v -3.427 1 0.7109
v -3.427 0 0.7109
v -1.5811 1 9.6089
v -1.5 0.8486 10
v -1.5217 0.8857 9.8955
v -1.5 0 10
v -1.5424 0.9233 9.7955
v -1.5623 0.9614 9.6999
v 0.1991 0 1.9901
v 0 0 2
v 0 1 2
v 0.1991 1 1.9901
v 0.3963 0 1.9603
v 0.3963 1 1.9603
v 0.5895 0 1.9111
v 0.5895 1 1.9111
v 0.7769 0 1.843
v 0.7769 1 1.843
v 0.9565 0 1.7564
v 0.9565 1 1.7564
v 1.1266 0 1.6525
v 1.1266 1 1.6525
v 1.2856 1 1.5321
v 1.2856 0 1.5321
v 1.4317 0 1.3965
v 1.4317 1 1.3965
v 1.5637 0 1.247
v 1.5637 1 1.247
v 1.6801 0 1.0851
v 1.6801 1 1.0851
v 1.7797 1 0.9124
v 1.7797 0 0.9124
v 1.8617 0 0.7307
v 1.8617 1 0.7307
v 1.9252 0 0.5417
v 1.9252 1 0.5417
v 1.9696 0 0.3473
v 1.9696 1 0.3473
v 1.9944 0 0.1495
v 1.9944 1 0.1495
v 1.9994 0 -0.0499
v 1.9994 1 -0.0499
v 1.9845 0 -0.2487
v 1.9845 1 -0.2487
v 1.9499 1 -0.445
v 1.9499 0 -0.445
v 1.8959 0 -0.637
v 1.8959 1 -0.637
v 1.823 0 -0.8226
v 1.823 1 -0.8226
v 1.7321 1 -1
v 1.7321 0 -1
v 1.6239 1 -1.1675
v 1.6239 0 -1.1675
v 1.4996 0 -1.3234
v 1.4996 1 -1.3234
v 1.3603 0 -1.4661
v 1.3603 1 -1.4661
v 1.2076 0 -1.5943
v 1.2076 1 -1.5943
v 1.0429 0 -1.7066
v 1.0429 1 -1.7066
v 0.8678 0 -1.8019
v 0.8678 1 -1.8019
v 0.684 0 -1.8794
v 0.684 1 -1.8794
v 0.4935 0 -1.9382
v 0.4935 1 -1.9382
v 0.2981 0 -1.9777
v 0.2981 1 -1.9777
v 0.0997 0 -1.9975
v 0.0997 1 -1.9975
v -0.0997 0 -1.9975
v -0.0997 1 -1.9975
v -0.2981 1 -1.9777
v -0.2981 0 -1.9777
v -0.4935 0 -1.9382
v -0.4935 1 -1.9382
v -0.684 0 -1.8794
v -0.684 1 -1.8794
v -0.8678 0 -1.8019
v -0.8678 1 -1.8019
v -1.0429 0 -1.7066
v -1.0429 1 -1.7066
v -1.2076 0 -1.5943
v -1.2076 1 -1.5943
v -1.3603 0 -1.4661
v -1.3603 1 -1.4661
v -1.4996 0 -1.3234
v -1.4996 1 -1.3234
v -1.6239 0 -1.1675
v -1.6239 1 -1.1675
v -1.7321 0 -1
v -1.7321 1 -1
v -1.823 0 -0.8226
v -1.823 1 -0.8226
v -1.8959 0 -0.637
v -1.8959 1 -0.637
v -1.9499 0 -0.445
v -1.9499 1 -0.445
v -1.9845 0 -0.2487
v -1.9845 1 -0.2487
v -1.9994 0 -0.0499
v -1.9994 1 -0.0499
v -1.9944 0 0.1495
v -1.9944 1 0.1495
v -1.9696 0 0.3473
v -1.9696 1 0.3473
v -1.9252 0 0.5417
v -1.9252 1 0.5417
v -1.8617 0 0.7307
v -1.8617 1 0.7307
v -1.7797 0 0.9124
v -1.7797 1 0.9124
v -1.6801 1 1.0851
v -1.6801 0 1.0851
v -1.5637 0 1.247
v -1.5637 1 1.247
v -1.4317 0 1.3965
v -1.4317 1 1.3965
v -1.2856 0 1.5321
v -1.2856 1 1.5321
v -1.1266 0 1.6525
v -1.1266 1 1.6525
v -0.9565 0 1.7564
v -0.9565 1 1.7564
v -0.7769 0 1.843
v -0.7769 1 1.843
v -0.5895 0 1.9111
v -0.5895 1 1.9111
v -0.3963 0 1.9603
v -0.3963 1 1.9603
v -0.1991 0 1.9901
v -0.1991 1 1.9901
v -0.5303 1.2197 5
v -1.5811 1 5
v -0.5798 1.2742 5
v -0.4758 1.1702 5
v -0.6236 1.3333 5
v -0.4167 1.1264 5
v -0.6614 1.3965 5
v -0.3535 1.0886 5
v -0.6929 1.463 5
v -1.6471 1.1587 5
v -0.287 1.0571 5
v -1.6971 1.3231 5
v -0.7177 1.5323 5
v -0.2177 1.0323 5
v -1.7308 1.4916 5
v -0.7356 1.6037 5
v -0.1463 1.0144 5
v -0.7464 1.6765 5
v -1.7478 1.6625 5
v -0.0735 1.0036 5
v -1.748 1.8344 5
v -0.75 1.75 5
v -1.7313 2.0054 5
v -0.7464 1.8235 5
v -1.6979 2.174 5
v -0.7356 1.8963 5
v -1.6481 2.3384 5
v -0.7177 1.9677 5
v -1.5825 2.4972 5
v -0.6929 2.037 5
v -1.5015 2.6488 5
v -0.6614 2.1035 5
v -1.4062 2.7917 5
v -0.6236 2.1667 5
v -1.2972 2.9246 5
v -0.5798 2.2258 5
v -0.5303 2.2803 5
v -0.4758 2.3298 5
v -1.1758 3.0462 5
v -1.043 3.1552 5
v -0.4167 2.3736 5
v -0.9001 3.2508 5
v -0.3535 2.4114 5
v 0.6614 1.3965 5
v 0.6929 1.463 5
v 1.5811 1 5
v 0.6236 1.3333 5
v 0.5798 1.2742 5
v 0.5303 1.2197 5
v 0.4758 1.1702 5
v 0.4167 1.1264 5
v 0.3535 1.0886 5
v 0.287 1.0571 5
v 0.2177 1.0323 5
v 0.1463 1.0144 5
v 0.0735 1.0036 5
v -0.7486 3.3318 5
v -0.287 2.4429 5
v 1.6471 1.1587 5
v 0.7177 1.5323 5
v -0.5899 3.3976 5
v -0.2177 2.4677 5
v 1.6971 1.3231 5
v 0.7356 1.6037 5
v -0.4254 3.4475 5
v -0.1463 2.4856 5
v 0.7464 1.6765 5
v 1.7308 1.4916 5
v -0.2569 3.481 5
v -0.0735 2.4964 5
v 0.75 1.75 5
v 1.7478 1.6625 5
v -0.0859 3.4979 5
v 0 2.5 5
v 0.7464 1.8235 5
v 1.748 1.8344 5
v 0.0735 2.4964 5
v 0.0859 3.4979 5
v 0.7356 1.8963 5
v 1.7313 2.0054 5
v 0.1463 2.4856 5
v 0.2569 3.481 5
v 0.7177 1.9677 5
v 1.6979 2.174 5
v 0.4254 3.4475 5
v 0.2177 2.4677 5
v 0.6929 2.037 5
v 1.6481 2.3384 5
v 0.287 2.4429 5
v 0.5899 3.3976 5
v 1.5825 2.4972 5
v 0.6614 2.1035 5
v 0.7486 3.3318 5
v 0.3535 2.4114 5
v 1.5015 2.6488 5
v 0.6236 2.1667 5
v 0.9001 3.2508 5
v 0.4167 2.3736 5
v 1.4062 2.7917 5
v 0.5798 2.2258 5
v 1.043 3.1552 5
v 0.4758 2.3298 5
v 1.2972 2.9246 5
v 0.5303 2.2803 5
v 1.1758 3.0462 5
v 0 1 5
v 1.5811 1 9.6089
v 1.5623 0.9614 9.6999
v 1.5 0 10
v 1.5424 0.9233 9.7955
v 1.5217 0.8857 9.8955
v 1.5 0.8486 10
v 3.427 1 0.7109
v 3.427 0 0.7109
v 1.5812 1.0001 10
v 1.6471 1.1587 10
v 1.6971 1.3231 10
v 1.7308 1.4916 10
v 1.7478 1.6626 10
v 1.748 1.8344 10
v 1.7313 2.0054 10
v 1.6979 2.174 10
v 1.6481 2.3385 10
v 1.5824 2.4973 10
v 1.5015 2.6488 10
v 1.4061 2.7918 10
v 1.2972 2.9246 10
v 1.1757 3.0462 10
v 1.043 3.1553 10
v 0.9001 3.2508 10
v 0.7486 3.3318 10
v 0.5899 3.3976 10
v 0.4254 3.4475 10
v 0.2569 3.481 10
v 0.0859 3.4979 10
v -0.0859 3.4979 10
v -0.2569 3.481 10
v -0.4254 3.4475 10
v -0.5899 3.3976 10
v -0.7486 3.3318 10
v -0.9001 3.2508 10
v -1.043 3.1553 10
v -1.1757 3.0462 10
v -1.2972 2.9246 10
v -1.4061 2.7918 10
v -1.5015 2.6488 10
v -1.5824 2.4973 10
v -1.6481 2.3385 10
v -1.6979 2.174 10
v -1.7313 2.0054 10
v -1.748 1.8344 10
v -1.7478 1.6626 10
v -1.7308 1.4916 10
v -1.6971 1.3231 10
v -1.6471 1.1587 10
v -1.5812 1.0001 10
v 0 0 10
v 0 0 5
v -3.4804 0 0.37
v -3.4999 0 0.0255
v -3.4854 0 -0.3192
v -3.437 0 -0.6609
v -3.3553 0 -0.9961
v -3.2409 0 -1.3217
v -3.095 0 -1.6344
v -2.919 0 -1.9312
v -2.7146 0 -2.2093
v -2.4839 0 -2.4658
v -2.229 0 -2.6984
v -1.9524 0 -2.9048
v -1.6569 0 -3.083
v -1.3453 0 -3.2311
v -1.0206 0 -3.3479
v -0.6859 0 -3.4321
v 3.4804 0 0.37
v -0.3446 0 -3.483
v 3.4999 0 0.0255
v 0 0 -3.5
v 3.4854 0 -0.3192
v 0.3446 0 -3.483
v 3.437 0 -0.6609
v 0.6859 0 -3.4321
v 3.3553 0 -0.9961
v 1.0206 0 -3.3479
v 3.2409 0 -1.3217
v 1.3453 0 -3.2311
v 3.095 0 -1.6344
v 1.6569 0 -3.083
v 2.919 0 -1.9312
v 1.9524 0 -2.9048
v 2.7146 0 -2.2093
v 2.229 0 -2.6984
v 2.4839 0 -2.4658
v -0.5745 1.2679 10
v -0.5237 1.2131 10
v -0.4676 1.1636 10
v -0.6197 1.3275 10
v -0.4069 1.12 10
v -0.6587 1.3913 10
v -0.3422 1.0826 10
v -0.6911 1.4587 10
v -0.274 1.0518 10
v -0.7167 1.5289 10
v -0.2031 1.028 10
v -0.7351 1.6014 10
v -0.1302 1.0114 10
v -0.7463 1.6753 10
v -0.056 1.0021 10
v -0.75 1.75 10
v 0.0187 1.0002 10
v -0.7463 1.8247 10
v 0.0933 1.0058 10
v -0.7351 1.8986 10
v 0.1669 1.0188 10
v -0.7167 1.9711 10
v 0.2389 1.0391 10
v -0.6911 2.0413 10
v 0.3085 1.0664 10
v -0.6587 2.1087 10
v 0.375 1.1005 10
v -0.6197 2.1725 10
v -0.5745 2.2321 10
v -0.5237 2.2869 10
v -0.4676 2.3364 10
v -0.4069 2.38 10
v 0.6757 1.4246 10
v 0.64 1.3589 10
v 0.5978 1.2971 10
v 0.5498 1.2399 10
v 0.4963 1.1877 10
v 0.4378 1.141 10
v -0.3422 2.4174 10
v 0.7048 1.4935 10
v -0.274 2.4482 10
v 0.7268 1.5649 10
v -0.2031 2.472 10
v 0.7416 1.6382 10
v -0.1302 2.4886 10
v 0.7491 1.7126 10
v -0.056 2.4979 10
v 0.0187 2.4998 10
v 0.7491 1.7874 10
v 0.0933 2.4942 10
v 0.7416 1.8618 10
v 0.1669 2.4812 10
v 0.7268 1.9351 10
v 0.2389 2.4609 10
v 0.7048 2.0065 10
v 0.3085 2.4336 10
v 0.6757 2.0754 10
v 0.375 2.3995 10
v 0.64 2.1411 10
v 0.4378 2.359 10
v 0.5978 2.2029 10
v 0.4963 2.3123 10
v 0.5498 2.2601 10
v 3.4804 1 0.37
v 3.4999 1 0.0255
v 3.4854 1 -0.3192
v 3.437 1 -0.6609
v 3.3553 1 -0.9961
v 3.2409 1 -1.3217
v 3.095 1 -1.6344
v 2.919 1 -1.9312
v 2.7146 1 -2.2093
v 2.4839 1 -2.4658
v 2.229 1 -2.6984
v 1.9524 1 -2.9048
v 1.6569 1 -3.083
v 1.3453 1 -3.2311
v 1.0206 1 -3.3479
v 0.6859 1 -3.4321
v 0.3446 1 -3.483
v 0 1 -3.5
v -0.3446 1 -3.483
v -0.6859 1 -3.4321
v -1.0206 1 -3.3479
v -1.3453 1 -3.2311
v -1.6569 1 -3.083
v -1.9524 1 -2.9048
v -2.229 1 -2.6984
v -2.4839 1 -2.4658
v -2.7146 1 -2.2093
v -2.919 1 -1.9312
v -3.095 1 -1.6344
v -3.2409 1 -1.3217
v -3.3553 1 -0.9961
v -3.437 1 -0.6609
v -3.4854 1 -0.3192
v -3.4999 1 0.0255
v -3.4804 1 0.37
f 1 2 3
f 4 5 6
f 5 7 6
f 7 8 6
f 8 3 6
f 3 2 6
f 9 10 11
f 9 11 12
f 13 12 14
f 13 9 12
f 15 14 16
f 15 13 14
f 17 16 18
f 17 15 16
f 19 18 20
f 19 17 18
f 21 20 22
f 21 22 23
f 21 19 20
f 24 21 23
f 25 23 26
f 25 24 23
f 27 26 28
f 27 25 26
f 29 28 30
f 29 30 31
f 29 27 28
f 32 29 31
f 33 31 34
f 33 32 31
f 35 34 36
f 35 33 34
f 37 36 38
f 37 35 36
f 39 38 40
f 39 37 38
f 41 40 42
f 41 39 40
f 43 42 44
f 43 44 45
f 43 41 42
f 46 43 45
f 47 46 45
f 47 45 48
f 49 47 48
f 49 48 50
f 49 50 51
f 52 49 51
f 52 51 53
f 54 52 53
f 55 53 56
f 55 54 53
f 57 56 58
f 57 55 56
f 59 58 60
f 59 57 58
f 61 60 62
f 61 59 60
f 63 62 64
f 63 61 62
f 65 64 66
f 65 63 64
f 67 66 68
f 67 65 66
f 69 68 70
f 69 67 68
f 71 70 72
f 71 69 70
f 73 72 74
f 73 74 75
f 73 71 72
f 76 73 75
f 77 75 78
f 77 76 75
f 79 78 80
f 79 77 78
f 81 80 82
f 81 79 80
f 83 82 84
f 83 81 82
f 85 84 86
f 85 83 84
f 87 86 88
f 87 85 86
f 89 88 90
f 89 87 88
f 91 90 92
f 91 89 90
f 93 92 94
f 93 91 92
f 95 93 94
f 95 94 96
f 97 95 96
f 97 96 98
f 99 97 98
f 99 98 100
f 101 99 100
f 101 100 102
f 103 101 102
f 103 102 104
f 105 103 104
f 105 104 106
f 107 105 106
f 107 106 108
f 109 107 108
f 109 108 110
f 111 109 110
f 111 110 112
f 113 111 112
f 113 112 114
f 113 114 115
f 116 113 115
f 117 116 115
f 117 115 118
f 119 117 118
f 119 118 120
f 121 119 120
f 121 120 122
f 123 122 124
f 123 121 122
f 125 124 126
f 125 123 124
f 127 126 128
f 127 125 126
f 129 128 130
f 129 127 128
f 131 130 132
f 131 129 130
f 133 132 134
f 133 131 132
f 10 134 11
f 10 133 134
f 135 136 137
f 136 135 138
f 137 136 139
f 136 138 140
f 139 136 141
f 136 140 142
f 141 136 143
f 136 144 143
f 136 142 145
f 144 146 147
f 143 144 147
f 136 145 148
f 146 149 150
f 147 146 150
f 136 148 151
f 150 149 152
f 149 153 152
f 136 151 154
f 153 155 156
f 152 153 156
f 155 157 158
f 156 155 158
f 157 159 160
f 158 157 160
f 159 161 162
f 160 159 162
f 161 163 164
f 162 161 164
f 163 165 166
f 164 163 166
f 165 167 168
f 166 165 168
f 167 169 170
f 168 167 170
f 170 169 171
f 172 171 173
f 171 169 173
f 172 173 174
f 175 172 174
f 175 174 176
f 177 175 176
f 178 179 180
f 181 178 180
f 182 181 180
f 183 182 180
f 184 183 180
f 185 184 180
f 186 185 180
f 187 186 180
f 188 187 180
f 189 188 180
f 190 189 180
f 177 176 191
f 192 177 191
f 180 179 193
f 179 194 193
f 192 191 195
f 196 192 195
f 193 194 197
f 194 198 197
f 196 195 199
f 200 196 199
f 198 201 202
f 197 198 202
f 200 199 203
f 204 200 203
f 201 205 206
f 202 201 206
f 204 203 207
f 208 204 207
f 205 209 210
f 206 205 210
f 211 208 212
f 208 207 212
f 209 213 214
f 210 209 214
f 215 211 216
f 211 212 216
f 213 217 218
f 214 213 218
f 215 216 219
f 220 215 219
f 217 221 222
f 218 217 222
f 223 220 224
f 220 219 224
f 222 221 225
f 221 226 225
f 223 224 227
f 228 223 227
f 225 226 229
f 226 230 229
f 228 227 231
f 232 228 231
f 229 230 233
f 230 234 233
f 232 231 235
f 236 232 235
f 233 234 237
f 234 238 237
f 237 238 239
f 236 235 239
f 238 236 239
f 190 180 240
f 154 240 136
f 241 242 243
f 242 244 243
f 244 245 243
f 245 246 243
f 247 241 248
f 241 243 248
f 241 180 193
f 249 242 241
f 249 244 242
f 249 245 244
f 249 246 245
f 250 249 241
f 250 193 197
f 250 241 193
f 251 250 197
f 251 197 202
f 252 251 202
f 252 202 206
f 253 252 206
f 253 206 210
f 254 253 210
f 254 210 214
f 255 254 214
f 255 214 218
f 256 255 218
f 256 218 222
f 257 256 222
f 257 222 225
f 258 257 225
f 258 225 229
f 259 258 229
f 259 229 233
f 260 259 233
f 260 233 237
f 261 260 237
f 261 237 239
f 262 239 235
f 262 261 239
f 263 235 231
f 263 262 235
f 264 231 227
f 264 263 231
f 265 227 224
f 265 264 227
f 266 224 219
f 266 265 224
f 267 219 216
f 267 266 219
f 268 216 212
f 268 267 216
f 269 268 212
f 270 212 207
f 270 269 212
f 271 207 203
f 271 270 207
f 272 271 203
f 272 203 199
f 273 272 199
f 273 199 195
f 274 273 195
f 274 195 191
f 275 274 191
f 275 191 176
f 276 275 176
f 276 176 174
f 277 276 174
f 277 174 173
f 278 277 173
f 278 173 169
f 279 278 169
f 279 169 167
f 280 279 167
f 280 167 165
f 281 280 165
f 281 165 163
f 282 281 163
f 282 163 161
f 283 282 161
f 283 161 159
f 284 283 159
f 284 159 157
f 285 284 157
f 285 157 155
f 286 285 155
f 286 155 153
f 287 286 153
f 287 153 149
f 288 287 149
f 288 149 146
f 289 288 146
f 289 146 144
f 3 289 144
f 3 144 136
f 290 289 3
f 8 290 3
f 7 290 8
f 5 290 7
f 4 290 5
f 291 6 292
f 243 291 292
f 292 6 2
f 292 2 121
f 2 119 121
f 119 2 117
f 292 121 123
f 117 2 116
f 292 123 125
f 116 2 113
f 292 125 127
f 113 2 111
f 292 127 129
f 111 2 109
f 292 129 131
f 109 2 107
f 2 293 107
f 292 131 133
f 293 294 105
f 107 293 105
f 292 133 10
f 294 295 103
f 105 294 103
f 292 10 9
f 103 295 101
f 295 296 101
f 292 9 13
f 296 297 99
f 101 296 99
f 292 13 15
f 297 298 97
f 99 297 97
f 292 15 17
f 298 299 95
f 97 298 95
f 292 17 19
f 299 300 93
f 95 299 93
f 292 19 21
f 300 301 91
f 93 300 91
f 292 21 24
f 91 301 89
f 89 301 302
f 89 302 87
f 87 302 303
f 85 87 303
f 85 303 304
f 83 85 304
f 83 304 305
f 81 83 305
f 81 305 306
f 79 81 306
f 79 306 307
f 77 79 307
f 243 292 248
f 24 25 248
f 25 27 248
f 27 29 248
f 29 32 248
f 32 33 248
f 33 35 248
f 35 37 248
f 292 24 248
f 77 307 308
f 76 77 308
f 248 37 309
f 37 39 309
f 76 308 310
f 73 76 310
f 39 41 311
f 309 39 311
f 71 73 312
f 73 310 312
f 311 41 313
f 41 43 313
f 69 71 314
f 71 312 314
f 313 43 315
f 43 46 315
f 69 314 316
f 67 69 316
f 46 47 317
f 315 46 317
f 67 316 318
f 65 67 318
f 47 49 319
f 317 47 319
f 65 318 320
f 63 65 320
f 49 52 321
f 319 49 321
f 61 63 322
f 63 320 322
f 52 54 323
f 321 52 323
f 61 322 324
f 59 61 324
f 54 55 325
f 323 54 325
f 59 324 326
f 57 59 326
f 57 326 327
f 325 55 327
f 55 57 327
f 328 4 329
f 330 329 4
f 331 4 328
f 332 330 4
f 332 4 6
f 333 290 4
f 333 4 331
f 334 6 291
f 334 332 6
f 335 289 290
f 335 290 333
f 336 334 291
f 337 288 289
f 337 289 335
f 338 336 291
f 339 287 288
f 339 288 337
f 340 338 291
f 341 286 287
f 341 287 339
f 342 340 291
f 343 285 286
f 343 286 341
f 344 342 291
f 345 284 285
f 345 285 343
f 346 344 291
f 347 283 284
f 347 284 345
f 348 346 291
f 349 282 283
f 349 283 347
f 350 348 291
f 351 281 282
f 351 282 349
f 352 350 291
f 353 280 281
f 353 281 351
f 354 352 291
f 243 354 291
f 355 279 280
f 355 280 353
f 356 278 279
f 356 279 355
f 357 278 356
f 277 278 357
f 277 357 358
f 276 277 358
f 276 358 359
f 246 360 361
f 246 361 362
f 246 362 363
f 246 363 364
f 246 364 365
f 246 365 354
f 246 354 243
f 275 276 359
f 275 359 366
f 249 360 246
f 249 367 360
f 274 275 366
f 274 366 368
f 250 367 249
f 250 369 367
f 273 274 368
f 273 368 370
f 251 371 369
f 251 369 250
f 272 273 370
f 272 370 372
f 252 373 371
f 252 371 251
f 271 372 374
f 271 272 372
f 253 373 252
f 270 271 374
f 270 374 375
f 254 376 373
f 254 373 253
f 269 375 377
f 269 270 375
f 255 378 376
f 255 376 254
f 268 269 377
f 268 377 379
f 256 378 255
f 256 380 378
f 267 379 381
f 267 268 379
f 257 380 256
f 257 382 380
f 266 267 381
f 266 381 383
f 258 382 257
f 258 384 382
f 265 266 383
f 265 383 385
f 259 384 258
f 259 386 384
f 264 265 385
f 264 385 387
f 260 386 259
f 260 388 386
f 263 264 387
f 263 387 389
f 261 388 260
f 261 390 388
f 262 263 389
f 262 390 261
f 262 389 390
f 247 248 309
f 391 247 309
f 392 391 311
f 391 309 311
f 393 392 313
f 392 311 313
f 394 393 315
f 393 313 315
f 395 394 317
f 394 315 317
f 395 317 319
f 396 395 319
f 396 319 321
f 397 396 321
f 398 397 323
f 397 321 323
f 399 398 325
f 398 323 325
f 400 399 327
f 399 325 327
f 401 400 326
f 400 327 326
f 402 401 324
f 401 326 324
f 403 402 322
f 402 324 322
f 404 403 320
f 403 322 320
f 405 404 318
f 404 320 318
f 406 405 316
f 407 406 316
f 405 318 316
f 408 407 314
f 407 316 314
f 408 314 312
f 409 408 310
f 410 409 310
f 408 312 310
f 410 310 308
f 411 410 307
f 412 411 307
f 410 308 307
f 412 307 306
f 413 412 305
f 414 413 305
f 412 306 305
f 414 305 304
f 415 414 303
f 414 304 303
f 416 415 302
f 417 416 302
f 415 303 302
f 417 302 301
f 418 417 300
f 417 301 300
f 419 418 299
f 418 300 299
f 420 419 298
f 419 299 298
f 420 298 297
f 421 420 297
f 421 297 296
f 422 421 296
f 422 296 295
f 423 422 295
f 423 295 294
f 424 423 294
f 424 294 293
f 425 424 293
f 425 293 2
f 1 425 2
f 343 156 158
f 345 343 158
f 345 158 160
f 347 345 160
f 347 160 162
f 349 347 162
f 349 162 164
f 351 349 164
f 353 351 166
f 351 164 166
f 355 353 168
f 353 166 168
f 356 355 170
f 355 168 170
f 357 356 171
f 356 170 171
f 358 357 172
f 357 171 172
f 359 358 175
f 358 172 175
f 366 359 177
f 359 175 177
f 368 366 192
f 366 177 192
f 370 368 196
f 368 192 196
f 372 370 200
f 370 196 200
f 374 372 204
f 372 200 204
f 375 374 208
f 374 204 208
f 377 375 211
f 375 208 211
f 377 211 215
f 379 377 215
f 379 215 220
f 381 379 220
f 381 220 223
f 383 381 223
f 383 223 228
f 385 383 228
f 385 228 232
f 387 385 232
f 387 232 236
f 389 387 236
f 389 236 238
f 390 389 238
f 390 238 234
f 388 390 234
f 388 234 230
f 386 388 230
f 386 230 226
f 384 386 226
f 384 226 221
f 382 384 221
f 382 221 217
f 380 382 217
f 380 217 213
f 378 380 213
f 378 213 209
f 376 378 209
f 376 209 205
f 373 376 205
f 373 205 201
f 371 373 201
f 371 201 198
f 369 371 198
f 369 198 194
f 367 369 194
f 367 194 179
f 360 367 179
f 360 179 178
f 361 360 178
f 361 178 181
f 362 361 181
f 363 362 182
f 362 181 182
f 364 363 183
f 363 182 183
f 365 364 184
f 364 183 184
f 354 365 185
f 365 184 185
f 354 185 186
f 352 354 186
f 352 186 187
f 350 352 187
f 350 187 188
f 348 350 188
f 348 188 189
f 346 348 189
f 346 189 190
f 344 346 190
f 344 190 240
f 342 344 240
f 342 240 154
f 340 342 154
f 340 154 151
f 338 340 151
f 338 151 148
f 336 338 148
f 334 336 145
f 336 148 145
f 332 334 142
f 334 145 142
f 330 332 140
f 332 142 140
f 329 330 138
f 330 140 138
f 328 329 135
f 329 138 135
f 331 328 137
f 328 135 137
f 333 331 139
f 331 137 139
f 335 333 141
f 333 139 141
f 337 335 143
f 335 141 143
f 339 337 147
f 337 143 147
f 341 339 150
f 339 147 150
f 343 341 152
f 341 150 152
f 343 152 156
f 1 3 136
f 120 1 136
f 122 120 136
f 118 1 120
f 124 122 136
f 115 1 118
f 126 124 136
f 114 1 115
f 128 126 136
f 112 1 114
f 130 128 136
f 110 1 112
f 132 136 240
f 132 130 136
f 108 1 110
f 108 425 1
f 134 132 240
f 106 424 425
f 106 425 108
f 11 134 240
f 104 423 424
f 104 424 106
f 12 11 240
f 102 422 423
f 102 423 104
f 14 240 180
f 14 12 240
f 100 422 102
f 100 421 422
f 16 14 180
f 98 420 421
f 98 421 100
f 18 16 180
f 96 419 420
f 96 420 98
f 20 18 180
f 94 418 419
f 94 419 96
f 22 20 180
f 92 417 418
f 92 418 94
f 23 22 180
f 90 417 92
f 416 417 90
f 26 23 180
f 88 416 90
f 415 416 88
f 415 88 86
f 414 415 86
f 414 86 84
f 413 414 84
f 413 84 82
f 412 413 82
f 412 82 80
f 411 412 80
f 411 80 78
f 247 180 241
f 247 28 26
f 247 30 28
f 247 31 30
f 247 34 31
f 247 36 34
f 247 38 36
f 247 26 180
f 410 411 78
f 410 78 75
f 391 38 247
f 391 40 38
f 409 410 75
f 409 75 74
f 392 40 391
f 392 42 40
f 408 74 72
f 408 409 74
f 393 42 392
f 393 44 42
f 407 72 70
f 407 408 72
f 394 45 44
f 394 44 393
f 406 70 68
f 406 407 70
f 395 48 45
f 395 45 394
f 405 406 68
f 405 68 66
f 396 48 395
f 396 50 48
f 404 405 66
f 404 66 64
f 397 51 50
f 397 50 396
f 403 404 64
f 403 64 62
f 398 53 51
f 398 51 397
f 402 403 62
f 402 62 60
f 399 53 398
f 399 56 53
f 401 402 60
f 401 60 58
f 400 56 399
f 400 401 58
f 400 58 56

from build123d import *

# Parameters (mm, degrees)
SKETCH_1_R          = 2
EXTRUDE_1_DEPTH     = 1
EXTRUDE_START       = 10
SKETCH_2_R          = 1.75
EXTRUDE_2_DEPTH     = 5
SKETCH_3_R          = 0.75
CUT_EXTRUDE_1_DEPTH = 5


with BuildPart() as part:
    # 草图1 → 凸台-拉伸1 (new body)
    with BuildSketch(Plane(origin=(0, 0, 0), x_dir=(1, 0, 0), z_dir=(0, 1, 0))):
        with BuildLine():
            Line((-1.5, -10), (1.5, -10))
            Line((1.5, -10), (3.427033294, -0.710945006))
            ThreePointArc((3.427033294, -0.710945006), (0, 3.5), (-3.427033294, -0.710945006))
            Line((-3.427033294, -0.710945006), (-1.5, -10))
        make_face()
        with Locations(Location((0, 0, 0), (0, 0, 270))):
            Circle(SKETCH_1_R, mode=Mode.SUBTRACT)
    extrude(amount=EXTRUDE_1_DEPTH)

    # 草图2 → 凸台-拉伸2 (add)
    with BuildSketch(Plane.XY.offset(EXTRUDE_START)):
        with Locations((0, 1.75)):
            Circle(SKETCH_2_R)
    extrude(amount=-EXTRUDE_2_DEPTH)

    # 草图3 → 切除-拉伸1 (cut)
    with BuildSketch(Plane(origin=(0, 0, 5), x_dir=(-1, 0, 0), z_dir=(0, 0, -1))):
        with Locations((0, 1.75)):
            Circle(SKETCH_3_R)
    extrude(amount=-CUT_EXTRUDE_1_DEPTH, mode=Mode.SUBTRACT)


solid = part.part
